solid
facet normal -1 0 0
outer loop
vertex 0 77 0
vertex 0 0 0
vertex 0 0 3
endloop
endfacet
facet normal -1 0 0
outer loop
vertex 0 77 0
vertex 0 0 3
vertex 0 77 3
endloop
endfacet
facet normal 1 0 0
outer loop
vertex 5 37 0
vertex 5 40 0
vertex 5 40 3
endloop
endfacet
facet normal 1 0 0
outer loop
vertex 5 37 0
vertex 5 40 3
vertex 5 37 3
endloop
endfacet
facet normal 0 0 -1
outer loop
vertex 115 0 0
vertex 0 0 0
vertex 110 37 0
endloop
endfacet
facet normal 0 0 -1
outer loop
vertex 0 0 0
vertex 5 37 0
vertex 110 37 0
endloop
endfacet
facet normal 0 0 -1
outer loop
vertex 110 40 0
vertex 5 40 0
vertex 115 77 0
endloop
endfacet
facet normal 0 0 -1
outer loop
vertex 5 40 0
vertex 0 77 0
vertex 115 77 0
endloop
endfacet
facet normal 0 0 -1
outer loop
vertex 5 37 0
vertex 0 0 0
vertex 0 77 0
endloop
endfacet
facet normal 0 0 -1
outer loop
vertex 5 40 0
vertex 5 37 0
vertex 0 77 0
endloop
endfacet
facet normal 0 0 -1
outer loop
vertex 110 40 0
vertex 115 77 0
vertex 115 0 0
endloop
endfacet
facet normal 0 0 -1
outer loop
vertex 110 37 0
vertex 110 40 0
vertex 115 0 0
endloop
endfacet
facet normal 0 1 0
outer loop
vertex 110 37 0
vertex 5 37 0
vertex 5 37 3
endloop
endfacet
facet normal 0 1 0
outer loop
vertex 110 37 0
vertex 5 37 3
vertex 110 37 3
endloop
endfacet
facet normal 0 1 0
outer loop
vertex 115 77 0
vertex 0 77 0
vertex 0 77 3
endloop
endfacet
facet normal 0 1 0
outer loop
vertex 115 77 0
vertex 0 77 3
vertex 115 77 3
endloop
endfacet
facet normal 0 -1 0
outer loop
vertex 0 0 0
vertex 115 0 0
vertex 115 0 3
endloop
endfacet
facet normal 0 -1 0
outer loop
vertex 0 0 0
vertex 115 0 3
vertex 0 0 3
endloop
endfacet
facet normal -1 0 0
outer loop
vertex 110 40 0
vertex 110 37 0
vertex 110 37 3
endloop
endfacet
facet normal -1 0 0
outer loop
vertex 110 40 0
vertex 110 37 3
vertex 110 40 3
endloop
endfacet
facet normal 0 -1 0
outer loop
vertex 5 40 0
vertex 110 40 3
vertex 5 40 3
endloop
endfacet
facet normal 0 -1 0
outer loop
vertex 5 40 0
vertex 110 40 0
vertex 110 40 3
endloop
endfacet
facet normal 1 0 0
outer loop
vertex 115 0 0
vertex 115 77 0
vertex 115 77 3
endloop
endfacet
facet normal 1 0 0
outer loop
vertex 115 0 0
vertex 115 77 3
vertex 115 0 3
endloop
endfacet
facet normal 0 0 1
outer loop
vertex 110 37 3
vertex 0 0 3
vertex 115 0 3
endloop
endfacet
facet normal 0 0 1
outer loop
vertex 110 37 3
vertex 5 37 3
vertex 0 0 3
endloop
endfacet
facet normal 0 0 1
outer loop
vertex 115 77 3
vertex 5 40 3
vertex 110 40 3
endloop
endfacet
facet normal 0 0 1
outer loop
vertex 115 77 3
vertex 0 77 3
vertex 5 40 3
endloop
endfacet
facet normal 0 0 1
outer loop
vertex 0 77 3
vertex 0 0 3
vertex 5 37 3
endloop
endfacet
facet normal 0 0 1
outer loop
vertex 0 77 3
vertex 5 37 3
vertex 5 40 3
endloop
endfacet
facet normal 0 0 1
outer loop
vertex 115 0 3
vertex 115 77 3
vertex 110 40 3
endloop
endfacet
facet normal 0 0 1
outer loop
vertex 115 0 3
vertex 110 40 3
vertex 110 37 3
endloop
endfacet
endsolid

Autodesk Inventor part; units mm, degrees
ref_plane "YZ Plane" through (0, 0, 0) normal (1, 0, 0) x (0, 1, 0)
ref_plane "XZ Plane" through (0, 0, 0) normal (0, 1, 0) x (-1, 0, 0)
ref_plane "XY Plane" through (0, 0, 0) normal (0, 0, 1) x (1, 0, 0)
sketch "Sketch1" plane through (0, 0, 0) normal (0, 0, 1) x (1, 0, 0)
  line L0 (0, 0) -> (0, 77)
  line L1 (0, 77) -> (115, 77)
  line L2 (115, 77) -> (115, 0)
  line L3 (115, 0) -> (0, 0)
  dimension "d0" = 77
  dimension "d1" = 115
extrude "Extrusion1" add sketch "Sketch1" along normal blind 3
sketch "Sketch2" plane through (0, 0, 0) normal (0, 0, -1) x (-1, 0, 0)
  line L0 (-110, 40) -> (-5, 40)
  line L1 (-5, 40) -> (-5, 37)
  line L2 (-5, 37) -> (-110, 37)
  line L3 (-110, 37) -> (-110, 40)
  line L4 (0, 77) -> (0, 0) projected
  line L5 (-115, 0) -> (-115, 77) projected
  point P0 (-5, 38.5)
  point P1 (0, 38.5)
  dimension "d4" = 3
  dimension "d5" = 5
  dimension "d6" = 5
extrude "Extrusion2" cut sketch "Sketch2" against normal blind 10
properties part number "rampa"
